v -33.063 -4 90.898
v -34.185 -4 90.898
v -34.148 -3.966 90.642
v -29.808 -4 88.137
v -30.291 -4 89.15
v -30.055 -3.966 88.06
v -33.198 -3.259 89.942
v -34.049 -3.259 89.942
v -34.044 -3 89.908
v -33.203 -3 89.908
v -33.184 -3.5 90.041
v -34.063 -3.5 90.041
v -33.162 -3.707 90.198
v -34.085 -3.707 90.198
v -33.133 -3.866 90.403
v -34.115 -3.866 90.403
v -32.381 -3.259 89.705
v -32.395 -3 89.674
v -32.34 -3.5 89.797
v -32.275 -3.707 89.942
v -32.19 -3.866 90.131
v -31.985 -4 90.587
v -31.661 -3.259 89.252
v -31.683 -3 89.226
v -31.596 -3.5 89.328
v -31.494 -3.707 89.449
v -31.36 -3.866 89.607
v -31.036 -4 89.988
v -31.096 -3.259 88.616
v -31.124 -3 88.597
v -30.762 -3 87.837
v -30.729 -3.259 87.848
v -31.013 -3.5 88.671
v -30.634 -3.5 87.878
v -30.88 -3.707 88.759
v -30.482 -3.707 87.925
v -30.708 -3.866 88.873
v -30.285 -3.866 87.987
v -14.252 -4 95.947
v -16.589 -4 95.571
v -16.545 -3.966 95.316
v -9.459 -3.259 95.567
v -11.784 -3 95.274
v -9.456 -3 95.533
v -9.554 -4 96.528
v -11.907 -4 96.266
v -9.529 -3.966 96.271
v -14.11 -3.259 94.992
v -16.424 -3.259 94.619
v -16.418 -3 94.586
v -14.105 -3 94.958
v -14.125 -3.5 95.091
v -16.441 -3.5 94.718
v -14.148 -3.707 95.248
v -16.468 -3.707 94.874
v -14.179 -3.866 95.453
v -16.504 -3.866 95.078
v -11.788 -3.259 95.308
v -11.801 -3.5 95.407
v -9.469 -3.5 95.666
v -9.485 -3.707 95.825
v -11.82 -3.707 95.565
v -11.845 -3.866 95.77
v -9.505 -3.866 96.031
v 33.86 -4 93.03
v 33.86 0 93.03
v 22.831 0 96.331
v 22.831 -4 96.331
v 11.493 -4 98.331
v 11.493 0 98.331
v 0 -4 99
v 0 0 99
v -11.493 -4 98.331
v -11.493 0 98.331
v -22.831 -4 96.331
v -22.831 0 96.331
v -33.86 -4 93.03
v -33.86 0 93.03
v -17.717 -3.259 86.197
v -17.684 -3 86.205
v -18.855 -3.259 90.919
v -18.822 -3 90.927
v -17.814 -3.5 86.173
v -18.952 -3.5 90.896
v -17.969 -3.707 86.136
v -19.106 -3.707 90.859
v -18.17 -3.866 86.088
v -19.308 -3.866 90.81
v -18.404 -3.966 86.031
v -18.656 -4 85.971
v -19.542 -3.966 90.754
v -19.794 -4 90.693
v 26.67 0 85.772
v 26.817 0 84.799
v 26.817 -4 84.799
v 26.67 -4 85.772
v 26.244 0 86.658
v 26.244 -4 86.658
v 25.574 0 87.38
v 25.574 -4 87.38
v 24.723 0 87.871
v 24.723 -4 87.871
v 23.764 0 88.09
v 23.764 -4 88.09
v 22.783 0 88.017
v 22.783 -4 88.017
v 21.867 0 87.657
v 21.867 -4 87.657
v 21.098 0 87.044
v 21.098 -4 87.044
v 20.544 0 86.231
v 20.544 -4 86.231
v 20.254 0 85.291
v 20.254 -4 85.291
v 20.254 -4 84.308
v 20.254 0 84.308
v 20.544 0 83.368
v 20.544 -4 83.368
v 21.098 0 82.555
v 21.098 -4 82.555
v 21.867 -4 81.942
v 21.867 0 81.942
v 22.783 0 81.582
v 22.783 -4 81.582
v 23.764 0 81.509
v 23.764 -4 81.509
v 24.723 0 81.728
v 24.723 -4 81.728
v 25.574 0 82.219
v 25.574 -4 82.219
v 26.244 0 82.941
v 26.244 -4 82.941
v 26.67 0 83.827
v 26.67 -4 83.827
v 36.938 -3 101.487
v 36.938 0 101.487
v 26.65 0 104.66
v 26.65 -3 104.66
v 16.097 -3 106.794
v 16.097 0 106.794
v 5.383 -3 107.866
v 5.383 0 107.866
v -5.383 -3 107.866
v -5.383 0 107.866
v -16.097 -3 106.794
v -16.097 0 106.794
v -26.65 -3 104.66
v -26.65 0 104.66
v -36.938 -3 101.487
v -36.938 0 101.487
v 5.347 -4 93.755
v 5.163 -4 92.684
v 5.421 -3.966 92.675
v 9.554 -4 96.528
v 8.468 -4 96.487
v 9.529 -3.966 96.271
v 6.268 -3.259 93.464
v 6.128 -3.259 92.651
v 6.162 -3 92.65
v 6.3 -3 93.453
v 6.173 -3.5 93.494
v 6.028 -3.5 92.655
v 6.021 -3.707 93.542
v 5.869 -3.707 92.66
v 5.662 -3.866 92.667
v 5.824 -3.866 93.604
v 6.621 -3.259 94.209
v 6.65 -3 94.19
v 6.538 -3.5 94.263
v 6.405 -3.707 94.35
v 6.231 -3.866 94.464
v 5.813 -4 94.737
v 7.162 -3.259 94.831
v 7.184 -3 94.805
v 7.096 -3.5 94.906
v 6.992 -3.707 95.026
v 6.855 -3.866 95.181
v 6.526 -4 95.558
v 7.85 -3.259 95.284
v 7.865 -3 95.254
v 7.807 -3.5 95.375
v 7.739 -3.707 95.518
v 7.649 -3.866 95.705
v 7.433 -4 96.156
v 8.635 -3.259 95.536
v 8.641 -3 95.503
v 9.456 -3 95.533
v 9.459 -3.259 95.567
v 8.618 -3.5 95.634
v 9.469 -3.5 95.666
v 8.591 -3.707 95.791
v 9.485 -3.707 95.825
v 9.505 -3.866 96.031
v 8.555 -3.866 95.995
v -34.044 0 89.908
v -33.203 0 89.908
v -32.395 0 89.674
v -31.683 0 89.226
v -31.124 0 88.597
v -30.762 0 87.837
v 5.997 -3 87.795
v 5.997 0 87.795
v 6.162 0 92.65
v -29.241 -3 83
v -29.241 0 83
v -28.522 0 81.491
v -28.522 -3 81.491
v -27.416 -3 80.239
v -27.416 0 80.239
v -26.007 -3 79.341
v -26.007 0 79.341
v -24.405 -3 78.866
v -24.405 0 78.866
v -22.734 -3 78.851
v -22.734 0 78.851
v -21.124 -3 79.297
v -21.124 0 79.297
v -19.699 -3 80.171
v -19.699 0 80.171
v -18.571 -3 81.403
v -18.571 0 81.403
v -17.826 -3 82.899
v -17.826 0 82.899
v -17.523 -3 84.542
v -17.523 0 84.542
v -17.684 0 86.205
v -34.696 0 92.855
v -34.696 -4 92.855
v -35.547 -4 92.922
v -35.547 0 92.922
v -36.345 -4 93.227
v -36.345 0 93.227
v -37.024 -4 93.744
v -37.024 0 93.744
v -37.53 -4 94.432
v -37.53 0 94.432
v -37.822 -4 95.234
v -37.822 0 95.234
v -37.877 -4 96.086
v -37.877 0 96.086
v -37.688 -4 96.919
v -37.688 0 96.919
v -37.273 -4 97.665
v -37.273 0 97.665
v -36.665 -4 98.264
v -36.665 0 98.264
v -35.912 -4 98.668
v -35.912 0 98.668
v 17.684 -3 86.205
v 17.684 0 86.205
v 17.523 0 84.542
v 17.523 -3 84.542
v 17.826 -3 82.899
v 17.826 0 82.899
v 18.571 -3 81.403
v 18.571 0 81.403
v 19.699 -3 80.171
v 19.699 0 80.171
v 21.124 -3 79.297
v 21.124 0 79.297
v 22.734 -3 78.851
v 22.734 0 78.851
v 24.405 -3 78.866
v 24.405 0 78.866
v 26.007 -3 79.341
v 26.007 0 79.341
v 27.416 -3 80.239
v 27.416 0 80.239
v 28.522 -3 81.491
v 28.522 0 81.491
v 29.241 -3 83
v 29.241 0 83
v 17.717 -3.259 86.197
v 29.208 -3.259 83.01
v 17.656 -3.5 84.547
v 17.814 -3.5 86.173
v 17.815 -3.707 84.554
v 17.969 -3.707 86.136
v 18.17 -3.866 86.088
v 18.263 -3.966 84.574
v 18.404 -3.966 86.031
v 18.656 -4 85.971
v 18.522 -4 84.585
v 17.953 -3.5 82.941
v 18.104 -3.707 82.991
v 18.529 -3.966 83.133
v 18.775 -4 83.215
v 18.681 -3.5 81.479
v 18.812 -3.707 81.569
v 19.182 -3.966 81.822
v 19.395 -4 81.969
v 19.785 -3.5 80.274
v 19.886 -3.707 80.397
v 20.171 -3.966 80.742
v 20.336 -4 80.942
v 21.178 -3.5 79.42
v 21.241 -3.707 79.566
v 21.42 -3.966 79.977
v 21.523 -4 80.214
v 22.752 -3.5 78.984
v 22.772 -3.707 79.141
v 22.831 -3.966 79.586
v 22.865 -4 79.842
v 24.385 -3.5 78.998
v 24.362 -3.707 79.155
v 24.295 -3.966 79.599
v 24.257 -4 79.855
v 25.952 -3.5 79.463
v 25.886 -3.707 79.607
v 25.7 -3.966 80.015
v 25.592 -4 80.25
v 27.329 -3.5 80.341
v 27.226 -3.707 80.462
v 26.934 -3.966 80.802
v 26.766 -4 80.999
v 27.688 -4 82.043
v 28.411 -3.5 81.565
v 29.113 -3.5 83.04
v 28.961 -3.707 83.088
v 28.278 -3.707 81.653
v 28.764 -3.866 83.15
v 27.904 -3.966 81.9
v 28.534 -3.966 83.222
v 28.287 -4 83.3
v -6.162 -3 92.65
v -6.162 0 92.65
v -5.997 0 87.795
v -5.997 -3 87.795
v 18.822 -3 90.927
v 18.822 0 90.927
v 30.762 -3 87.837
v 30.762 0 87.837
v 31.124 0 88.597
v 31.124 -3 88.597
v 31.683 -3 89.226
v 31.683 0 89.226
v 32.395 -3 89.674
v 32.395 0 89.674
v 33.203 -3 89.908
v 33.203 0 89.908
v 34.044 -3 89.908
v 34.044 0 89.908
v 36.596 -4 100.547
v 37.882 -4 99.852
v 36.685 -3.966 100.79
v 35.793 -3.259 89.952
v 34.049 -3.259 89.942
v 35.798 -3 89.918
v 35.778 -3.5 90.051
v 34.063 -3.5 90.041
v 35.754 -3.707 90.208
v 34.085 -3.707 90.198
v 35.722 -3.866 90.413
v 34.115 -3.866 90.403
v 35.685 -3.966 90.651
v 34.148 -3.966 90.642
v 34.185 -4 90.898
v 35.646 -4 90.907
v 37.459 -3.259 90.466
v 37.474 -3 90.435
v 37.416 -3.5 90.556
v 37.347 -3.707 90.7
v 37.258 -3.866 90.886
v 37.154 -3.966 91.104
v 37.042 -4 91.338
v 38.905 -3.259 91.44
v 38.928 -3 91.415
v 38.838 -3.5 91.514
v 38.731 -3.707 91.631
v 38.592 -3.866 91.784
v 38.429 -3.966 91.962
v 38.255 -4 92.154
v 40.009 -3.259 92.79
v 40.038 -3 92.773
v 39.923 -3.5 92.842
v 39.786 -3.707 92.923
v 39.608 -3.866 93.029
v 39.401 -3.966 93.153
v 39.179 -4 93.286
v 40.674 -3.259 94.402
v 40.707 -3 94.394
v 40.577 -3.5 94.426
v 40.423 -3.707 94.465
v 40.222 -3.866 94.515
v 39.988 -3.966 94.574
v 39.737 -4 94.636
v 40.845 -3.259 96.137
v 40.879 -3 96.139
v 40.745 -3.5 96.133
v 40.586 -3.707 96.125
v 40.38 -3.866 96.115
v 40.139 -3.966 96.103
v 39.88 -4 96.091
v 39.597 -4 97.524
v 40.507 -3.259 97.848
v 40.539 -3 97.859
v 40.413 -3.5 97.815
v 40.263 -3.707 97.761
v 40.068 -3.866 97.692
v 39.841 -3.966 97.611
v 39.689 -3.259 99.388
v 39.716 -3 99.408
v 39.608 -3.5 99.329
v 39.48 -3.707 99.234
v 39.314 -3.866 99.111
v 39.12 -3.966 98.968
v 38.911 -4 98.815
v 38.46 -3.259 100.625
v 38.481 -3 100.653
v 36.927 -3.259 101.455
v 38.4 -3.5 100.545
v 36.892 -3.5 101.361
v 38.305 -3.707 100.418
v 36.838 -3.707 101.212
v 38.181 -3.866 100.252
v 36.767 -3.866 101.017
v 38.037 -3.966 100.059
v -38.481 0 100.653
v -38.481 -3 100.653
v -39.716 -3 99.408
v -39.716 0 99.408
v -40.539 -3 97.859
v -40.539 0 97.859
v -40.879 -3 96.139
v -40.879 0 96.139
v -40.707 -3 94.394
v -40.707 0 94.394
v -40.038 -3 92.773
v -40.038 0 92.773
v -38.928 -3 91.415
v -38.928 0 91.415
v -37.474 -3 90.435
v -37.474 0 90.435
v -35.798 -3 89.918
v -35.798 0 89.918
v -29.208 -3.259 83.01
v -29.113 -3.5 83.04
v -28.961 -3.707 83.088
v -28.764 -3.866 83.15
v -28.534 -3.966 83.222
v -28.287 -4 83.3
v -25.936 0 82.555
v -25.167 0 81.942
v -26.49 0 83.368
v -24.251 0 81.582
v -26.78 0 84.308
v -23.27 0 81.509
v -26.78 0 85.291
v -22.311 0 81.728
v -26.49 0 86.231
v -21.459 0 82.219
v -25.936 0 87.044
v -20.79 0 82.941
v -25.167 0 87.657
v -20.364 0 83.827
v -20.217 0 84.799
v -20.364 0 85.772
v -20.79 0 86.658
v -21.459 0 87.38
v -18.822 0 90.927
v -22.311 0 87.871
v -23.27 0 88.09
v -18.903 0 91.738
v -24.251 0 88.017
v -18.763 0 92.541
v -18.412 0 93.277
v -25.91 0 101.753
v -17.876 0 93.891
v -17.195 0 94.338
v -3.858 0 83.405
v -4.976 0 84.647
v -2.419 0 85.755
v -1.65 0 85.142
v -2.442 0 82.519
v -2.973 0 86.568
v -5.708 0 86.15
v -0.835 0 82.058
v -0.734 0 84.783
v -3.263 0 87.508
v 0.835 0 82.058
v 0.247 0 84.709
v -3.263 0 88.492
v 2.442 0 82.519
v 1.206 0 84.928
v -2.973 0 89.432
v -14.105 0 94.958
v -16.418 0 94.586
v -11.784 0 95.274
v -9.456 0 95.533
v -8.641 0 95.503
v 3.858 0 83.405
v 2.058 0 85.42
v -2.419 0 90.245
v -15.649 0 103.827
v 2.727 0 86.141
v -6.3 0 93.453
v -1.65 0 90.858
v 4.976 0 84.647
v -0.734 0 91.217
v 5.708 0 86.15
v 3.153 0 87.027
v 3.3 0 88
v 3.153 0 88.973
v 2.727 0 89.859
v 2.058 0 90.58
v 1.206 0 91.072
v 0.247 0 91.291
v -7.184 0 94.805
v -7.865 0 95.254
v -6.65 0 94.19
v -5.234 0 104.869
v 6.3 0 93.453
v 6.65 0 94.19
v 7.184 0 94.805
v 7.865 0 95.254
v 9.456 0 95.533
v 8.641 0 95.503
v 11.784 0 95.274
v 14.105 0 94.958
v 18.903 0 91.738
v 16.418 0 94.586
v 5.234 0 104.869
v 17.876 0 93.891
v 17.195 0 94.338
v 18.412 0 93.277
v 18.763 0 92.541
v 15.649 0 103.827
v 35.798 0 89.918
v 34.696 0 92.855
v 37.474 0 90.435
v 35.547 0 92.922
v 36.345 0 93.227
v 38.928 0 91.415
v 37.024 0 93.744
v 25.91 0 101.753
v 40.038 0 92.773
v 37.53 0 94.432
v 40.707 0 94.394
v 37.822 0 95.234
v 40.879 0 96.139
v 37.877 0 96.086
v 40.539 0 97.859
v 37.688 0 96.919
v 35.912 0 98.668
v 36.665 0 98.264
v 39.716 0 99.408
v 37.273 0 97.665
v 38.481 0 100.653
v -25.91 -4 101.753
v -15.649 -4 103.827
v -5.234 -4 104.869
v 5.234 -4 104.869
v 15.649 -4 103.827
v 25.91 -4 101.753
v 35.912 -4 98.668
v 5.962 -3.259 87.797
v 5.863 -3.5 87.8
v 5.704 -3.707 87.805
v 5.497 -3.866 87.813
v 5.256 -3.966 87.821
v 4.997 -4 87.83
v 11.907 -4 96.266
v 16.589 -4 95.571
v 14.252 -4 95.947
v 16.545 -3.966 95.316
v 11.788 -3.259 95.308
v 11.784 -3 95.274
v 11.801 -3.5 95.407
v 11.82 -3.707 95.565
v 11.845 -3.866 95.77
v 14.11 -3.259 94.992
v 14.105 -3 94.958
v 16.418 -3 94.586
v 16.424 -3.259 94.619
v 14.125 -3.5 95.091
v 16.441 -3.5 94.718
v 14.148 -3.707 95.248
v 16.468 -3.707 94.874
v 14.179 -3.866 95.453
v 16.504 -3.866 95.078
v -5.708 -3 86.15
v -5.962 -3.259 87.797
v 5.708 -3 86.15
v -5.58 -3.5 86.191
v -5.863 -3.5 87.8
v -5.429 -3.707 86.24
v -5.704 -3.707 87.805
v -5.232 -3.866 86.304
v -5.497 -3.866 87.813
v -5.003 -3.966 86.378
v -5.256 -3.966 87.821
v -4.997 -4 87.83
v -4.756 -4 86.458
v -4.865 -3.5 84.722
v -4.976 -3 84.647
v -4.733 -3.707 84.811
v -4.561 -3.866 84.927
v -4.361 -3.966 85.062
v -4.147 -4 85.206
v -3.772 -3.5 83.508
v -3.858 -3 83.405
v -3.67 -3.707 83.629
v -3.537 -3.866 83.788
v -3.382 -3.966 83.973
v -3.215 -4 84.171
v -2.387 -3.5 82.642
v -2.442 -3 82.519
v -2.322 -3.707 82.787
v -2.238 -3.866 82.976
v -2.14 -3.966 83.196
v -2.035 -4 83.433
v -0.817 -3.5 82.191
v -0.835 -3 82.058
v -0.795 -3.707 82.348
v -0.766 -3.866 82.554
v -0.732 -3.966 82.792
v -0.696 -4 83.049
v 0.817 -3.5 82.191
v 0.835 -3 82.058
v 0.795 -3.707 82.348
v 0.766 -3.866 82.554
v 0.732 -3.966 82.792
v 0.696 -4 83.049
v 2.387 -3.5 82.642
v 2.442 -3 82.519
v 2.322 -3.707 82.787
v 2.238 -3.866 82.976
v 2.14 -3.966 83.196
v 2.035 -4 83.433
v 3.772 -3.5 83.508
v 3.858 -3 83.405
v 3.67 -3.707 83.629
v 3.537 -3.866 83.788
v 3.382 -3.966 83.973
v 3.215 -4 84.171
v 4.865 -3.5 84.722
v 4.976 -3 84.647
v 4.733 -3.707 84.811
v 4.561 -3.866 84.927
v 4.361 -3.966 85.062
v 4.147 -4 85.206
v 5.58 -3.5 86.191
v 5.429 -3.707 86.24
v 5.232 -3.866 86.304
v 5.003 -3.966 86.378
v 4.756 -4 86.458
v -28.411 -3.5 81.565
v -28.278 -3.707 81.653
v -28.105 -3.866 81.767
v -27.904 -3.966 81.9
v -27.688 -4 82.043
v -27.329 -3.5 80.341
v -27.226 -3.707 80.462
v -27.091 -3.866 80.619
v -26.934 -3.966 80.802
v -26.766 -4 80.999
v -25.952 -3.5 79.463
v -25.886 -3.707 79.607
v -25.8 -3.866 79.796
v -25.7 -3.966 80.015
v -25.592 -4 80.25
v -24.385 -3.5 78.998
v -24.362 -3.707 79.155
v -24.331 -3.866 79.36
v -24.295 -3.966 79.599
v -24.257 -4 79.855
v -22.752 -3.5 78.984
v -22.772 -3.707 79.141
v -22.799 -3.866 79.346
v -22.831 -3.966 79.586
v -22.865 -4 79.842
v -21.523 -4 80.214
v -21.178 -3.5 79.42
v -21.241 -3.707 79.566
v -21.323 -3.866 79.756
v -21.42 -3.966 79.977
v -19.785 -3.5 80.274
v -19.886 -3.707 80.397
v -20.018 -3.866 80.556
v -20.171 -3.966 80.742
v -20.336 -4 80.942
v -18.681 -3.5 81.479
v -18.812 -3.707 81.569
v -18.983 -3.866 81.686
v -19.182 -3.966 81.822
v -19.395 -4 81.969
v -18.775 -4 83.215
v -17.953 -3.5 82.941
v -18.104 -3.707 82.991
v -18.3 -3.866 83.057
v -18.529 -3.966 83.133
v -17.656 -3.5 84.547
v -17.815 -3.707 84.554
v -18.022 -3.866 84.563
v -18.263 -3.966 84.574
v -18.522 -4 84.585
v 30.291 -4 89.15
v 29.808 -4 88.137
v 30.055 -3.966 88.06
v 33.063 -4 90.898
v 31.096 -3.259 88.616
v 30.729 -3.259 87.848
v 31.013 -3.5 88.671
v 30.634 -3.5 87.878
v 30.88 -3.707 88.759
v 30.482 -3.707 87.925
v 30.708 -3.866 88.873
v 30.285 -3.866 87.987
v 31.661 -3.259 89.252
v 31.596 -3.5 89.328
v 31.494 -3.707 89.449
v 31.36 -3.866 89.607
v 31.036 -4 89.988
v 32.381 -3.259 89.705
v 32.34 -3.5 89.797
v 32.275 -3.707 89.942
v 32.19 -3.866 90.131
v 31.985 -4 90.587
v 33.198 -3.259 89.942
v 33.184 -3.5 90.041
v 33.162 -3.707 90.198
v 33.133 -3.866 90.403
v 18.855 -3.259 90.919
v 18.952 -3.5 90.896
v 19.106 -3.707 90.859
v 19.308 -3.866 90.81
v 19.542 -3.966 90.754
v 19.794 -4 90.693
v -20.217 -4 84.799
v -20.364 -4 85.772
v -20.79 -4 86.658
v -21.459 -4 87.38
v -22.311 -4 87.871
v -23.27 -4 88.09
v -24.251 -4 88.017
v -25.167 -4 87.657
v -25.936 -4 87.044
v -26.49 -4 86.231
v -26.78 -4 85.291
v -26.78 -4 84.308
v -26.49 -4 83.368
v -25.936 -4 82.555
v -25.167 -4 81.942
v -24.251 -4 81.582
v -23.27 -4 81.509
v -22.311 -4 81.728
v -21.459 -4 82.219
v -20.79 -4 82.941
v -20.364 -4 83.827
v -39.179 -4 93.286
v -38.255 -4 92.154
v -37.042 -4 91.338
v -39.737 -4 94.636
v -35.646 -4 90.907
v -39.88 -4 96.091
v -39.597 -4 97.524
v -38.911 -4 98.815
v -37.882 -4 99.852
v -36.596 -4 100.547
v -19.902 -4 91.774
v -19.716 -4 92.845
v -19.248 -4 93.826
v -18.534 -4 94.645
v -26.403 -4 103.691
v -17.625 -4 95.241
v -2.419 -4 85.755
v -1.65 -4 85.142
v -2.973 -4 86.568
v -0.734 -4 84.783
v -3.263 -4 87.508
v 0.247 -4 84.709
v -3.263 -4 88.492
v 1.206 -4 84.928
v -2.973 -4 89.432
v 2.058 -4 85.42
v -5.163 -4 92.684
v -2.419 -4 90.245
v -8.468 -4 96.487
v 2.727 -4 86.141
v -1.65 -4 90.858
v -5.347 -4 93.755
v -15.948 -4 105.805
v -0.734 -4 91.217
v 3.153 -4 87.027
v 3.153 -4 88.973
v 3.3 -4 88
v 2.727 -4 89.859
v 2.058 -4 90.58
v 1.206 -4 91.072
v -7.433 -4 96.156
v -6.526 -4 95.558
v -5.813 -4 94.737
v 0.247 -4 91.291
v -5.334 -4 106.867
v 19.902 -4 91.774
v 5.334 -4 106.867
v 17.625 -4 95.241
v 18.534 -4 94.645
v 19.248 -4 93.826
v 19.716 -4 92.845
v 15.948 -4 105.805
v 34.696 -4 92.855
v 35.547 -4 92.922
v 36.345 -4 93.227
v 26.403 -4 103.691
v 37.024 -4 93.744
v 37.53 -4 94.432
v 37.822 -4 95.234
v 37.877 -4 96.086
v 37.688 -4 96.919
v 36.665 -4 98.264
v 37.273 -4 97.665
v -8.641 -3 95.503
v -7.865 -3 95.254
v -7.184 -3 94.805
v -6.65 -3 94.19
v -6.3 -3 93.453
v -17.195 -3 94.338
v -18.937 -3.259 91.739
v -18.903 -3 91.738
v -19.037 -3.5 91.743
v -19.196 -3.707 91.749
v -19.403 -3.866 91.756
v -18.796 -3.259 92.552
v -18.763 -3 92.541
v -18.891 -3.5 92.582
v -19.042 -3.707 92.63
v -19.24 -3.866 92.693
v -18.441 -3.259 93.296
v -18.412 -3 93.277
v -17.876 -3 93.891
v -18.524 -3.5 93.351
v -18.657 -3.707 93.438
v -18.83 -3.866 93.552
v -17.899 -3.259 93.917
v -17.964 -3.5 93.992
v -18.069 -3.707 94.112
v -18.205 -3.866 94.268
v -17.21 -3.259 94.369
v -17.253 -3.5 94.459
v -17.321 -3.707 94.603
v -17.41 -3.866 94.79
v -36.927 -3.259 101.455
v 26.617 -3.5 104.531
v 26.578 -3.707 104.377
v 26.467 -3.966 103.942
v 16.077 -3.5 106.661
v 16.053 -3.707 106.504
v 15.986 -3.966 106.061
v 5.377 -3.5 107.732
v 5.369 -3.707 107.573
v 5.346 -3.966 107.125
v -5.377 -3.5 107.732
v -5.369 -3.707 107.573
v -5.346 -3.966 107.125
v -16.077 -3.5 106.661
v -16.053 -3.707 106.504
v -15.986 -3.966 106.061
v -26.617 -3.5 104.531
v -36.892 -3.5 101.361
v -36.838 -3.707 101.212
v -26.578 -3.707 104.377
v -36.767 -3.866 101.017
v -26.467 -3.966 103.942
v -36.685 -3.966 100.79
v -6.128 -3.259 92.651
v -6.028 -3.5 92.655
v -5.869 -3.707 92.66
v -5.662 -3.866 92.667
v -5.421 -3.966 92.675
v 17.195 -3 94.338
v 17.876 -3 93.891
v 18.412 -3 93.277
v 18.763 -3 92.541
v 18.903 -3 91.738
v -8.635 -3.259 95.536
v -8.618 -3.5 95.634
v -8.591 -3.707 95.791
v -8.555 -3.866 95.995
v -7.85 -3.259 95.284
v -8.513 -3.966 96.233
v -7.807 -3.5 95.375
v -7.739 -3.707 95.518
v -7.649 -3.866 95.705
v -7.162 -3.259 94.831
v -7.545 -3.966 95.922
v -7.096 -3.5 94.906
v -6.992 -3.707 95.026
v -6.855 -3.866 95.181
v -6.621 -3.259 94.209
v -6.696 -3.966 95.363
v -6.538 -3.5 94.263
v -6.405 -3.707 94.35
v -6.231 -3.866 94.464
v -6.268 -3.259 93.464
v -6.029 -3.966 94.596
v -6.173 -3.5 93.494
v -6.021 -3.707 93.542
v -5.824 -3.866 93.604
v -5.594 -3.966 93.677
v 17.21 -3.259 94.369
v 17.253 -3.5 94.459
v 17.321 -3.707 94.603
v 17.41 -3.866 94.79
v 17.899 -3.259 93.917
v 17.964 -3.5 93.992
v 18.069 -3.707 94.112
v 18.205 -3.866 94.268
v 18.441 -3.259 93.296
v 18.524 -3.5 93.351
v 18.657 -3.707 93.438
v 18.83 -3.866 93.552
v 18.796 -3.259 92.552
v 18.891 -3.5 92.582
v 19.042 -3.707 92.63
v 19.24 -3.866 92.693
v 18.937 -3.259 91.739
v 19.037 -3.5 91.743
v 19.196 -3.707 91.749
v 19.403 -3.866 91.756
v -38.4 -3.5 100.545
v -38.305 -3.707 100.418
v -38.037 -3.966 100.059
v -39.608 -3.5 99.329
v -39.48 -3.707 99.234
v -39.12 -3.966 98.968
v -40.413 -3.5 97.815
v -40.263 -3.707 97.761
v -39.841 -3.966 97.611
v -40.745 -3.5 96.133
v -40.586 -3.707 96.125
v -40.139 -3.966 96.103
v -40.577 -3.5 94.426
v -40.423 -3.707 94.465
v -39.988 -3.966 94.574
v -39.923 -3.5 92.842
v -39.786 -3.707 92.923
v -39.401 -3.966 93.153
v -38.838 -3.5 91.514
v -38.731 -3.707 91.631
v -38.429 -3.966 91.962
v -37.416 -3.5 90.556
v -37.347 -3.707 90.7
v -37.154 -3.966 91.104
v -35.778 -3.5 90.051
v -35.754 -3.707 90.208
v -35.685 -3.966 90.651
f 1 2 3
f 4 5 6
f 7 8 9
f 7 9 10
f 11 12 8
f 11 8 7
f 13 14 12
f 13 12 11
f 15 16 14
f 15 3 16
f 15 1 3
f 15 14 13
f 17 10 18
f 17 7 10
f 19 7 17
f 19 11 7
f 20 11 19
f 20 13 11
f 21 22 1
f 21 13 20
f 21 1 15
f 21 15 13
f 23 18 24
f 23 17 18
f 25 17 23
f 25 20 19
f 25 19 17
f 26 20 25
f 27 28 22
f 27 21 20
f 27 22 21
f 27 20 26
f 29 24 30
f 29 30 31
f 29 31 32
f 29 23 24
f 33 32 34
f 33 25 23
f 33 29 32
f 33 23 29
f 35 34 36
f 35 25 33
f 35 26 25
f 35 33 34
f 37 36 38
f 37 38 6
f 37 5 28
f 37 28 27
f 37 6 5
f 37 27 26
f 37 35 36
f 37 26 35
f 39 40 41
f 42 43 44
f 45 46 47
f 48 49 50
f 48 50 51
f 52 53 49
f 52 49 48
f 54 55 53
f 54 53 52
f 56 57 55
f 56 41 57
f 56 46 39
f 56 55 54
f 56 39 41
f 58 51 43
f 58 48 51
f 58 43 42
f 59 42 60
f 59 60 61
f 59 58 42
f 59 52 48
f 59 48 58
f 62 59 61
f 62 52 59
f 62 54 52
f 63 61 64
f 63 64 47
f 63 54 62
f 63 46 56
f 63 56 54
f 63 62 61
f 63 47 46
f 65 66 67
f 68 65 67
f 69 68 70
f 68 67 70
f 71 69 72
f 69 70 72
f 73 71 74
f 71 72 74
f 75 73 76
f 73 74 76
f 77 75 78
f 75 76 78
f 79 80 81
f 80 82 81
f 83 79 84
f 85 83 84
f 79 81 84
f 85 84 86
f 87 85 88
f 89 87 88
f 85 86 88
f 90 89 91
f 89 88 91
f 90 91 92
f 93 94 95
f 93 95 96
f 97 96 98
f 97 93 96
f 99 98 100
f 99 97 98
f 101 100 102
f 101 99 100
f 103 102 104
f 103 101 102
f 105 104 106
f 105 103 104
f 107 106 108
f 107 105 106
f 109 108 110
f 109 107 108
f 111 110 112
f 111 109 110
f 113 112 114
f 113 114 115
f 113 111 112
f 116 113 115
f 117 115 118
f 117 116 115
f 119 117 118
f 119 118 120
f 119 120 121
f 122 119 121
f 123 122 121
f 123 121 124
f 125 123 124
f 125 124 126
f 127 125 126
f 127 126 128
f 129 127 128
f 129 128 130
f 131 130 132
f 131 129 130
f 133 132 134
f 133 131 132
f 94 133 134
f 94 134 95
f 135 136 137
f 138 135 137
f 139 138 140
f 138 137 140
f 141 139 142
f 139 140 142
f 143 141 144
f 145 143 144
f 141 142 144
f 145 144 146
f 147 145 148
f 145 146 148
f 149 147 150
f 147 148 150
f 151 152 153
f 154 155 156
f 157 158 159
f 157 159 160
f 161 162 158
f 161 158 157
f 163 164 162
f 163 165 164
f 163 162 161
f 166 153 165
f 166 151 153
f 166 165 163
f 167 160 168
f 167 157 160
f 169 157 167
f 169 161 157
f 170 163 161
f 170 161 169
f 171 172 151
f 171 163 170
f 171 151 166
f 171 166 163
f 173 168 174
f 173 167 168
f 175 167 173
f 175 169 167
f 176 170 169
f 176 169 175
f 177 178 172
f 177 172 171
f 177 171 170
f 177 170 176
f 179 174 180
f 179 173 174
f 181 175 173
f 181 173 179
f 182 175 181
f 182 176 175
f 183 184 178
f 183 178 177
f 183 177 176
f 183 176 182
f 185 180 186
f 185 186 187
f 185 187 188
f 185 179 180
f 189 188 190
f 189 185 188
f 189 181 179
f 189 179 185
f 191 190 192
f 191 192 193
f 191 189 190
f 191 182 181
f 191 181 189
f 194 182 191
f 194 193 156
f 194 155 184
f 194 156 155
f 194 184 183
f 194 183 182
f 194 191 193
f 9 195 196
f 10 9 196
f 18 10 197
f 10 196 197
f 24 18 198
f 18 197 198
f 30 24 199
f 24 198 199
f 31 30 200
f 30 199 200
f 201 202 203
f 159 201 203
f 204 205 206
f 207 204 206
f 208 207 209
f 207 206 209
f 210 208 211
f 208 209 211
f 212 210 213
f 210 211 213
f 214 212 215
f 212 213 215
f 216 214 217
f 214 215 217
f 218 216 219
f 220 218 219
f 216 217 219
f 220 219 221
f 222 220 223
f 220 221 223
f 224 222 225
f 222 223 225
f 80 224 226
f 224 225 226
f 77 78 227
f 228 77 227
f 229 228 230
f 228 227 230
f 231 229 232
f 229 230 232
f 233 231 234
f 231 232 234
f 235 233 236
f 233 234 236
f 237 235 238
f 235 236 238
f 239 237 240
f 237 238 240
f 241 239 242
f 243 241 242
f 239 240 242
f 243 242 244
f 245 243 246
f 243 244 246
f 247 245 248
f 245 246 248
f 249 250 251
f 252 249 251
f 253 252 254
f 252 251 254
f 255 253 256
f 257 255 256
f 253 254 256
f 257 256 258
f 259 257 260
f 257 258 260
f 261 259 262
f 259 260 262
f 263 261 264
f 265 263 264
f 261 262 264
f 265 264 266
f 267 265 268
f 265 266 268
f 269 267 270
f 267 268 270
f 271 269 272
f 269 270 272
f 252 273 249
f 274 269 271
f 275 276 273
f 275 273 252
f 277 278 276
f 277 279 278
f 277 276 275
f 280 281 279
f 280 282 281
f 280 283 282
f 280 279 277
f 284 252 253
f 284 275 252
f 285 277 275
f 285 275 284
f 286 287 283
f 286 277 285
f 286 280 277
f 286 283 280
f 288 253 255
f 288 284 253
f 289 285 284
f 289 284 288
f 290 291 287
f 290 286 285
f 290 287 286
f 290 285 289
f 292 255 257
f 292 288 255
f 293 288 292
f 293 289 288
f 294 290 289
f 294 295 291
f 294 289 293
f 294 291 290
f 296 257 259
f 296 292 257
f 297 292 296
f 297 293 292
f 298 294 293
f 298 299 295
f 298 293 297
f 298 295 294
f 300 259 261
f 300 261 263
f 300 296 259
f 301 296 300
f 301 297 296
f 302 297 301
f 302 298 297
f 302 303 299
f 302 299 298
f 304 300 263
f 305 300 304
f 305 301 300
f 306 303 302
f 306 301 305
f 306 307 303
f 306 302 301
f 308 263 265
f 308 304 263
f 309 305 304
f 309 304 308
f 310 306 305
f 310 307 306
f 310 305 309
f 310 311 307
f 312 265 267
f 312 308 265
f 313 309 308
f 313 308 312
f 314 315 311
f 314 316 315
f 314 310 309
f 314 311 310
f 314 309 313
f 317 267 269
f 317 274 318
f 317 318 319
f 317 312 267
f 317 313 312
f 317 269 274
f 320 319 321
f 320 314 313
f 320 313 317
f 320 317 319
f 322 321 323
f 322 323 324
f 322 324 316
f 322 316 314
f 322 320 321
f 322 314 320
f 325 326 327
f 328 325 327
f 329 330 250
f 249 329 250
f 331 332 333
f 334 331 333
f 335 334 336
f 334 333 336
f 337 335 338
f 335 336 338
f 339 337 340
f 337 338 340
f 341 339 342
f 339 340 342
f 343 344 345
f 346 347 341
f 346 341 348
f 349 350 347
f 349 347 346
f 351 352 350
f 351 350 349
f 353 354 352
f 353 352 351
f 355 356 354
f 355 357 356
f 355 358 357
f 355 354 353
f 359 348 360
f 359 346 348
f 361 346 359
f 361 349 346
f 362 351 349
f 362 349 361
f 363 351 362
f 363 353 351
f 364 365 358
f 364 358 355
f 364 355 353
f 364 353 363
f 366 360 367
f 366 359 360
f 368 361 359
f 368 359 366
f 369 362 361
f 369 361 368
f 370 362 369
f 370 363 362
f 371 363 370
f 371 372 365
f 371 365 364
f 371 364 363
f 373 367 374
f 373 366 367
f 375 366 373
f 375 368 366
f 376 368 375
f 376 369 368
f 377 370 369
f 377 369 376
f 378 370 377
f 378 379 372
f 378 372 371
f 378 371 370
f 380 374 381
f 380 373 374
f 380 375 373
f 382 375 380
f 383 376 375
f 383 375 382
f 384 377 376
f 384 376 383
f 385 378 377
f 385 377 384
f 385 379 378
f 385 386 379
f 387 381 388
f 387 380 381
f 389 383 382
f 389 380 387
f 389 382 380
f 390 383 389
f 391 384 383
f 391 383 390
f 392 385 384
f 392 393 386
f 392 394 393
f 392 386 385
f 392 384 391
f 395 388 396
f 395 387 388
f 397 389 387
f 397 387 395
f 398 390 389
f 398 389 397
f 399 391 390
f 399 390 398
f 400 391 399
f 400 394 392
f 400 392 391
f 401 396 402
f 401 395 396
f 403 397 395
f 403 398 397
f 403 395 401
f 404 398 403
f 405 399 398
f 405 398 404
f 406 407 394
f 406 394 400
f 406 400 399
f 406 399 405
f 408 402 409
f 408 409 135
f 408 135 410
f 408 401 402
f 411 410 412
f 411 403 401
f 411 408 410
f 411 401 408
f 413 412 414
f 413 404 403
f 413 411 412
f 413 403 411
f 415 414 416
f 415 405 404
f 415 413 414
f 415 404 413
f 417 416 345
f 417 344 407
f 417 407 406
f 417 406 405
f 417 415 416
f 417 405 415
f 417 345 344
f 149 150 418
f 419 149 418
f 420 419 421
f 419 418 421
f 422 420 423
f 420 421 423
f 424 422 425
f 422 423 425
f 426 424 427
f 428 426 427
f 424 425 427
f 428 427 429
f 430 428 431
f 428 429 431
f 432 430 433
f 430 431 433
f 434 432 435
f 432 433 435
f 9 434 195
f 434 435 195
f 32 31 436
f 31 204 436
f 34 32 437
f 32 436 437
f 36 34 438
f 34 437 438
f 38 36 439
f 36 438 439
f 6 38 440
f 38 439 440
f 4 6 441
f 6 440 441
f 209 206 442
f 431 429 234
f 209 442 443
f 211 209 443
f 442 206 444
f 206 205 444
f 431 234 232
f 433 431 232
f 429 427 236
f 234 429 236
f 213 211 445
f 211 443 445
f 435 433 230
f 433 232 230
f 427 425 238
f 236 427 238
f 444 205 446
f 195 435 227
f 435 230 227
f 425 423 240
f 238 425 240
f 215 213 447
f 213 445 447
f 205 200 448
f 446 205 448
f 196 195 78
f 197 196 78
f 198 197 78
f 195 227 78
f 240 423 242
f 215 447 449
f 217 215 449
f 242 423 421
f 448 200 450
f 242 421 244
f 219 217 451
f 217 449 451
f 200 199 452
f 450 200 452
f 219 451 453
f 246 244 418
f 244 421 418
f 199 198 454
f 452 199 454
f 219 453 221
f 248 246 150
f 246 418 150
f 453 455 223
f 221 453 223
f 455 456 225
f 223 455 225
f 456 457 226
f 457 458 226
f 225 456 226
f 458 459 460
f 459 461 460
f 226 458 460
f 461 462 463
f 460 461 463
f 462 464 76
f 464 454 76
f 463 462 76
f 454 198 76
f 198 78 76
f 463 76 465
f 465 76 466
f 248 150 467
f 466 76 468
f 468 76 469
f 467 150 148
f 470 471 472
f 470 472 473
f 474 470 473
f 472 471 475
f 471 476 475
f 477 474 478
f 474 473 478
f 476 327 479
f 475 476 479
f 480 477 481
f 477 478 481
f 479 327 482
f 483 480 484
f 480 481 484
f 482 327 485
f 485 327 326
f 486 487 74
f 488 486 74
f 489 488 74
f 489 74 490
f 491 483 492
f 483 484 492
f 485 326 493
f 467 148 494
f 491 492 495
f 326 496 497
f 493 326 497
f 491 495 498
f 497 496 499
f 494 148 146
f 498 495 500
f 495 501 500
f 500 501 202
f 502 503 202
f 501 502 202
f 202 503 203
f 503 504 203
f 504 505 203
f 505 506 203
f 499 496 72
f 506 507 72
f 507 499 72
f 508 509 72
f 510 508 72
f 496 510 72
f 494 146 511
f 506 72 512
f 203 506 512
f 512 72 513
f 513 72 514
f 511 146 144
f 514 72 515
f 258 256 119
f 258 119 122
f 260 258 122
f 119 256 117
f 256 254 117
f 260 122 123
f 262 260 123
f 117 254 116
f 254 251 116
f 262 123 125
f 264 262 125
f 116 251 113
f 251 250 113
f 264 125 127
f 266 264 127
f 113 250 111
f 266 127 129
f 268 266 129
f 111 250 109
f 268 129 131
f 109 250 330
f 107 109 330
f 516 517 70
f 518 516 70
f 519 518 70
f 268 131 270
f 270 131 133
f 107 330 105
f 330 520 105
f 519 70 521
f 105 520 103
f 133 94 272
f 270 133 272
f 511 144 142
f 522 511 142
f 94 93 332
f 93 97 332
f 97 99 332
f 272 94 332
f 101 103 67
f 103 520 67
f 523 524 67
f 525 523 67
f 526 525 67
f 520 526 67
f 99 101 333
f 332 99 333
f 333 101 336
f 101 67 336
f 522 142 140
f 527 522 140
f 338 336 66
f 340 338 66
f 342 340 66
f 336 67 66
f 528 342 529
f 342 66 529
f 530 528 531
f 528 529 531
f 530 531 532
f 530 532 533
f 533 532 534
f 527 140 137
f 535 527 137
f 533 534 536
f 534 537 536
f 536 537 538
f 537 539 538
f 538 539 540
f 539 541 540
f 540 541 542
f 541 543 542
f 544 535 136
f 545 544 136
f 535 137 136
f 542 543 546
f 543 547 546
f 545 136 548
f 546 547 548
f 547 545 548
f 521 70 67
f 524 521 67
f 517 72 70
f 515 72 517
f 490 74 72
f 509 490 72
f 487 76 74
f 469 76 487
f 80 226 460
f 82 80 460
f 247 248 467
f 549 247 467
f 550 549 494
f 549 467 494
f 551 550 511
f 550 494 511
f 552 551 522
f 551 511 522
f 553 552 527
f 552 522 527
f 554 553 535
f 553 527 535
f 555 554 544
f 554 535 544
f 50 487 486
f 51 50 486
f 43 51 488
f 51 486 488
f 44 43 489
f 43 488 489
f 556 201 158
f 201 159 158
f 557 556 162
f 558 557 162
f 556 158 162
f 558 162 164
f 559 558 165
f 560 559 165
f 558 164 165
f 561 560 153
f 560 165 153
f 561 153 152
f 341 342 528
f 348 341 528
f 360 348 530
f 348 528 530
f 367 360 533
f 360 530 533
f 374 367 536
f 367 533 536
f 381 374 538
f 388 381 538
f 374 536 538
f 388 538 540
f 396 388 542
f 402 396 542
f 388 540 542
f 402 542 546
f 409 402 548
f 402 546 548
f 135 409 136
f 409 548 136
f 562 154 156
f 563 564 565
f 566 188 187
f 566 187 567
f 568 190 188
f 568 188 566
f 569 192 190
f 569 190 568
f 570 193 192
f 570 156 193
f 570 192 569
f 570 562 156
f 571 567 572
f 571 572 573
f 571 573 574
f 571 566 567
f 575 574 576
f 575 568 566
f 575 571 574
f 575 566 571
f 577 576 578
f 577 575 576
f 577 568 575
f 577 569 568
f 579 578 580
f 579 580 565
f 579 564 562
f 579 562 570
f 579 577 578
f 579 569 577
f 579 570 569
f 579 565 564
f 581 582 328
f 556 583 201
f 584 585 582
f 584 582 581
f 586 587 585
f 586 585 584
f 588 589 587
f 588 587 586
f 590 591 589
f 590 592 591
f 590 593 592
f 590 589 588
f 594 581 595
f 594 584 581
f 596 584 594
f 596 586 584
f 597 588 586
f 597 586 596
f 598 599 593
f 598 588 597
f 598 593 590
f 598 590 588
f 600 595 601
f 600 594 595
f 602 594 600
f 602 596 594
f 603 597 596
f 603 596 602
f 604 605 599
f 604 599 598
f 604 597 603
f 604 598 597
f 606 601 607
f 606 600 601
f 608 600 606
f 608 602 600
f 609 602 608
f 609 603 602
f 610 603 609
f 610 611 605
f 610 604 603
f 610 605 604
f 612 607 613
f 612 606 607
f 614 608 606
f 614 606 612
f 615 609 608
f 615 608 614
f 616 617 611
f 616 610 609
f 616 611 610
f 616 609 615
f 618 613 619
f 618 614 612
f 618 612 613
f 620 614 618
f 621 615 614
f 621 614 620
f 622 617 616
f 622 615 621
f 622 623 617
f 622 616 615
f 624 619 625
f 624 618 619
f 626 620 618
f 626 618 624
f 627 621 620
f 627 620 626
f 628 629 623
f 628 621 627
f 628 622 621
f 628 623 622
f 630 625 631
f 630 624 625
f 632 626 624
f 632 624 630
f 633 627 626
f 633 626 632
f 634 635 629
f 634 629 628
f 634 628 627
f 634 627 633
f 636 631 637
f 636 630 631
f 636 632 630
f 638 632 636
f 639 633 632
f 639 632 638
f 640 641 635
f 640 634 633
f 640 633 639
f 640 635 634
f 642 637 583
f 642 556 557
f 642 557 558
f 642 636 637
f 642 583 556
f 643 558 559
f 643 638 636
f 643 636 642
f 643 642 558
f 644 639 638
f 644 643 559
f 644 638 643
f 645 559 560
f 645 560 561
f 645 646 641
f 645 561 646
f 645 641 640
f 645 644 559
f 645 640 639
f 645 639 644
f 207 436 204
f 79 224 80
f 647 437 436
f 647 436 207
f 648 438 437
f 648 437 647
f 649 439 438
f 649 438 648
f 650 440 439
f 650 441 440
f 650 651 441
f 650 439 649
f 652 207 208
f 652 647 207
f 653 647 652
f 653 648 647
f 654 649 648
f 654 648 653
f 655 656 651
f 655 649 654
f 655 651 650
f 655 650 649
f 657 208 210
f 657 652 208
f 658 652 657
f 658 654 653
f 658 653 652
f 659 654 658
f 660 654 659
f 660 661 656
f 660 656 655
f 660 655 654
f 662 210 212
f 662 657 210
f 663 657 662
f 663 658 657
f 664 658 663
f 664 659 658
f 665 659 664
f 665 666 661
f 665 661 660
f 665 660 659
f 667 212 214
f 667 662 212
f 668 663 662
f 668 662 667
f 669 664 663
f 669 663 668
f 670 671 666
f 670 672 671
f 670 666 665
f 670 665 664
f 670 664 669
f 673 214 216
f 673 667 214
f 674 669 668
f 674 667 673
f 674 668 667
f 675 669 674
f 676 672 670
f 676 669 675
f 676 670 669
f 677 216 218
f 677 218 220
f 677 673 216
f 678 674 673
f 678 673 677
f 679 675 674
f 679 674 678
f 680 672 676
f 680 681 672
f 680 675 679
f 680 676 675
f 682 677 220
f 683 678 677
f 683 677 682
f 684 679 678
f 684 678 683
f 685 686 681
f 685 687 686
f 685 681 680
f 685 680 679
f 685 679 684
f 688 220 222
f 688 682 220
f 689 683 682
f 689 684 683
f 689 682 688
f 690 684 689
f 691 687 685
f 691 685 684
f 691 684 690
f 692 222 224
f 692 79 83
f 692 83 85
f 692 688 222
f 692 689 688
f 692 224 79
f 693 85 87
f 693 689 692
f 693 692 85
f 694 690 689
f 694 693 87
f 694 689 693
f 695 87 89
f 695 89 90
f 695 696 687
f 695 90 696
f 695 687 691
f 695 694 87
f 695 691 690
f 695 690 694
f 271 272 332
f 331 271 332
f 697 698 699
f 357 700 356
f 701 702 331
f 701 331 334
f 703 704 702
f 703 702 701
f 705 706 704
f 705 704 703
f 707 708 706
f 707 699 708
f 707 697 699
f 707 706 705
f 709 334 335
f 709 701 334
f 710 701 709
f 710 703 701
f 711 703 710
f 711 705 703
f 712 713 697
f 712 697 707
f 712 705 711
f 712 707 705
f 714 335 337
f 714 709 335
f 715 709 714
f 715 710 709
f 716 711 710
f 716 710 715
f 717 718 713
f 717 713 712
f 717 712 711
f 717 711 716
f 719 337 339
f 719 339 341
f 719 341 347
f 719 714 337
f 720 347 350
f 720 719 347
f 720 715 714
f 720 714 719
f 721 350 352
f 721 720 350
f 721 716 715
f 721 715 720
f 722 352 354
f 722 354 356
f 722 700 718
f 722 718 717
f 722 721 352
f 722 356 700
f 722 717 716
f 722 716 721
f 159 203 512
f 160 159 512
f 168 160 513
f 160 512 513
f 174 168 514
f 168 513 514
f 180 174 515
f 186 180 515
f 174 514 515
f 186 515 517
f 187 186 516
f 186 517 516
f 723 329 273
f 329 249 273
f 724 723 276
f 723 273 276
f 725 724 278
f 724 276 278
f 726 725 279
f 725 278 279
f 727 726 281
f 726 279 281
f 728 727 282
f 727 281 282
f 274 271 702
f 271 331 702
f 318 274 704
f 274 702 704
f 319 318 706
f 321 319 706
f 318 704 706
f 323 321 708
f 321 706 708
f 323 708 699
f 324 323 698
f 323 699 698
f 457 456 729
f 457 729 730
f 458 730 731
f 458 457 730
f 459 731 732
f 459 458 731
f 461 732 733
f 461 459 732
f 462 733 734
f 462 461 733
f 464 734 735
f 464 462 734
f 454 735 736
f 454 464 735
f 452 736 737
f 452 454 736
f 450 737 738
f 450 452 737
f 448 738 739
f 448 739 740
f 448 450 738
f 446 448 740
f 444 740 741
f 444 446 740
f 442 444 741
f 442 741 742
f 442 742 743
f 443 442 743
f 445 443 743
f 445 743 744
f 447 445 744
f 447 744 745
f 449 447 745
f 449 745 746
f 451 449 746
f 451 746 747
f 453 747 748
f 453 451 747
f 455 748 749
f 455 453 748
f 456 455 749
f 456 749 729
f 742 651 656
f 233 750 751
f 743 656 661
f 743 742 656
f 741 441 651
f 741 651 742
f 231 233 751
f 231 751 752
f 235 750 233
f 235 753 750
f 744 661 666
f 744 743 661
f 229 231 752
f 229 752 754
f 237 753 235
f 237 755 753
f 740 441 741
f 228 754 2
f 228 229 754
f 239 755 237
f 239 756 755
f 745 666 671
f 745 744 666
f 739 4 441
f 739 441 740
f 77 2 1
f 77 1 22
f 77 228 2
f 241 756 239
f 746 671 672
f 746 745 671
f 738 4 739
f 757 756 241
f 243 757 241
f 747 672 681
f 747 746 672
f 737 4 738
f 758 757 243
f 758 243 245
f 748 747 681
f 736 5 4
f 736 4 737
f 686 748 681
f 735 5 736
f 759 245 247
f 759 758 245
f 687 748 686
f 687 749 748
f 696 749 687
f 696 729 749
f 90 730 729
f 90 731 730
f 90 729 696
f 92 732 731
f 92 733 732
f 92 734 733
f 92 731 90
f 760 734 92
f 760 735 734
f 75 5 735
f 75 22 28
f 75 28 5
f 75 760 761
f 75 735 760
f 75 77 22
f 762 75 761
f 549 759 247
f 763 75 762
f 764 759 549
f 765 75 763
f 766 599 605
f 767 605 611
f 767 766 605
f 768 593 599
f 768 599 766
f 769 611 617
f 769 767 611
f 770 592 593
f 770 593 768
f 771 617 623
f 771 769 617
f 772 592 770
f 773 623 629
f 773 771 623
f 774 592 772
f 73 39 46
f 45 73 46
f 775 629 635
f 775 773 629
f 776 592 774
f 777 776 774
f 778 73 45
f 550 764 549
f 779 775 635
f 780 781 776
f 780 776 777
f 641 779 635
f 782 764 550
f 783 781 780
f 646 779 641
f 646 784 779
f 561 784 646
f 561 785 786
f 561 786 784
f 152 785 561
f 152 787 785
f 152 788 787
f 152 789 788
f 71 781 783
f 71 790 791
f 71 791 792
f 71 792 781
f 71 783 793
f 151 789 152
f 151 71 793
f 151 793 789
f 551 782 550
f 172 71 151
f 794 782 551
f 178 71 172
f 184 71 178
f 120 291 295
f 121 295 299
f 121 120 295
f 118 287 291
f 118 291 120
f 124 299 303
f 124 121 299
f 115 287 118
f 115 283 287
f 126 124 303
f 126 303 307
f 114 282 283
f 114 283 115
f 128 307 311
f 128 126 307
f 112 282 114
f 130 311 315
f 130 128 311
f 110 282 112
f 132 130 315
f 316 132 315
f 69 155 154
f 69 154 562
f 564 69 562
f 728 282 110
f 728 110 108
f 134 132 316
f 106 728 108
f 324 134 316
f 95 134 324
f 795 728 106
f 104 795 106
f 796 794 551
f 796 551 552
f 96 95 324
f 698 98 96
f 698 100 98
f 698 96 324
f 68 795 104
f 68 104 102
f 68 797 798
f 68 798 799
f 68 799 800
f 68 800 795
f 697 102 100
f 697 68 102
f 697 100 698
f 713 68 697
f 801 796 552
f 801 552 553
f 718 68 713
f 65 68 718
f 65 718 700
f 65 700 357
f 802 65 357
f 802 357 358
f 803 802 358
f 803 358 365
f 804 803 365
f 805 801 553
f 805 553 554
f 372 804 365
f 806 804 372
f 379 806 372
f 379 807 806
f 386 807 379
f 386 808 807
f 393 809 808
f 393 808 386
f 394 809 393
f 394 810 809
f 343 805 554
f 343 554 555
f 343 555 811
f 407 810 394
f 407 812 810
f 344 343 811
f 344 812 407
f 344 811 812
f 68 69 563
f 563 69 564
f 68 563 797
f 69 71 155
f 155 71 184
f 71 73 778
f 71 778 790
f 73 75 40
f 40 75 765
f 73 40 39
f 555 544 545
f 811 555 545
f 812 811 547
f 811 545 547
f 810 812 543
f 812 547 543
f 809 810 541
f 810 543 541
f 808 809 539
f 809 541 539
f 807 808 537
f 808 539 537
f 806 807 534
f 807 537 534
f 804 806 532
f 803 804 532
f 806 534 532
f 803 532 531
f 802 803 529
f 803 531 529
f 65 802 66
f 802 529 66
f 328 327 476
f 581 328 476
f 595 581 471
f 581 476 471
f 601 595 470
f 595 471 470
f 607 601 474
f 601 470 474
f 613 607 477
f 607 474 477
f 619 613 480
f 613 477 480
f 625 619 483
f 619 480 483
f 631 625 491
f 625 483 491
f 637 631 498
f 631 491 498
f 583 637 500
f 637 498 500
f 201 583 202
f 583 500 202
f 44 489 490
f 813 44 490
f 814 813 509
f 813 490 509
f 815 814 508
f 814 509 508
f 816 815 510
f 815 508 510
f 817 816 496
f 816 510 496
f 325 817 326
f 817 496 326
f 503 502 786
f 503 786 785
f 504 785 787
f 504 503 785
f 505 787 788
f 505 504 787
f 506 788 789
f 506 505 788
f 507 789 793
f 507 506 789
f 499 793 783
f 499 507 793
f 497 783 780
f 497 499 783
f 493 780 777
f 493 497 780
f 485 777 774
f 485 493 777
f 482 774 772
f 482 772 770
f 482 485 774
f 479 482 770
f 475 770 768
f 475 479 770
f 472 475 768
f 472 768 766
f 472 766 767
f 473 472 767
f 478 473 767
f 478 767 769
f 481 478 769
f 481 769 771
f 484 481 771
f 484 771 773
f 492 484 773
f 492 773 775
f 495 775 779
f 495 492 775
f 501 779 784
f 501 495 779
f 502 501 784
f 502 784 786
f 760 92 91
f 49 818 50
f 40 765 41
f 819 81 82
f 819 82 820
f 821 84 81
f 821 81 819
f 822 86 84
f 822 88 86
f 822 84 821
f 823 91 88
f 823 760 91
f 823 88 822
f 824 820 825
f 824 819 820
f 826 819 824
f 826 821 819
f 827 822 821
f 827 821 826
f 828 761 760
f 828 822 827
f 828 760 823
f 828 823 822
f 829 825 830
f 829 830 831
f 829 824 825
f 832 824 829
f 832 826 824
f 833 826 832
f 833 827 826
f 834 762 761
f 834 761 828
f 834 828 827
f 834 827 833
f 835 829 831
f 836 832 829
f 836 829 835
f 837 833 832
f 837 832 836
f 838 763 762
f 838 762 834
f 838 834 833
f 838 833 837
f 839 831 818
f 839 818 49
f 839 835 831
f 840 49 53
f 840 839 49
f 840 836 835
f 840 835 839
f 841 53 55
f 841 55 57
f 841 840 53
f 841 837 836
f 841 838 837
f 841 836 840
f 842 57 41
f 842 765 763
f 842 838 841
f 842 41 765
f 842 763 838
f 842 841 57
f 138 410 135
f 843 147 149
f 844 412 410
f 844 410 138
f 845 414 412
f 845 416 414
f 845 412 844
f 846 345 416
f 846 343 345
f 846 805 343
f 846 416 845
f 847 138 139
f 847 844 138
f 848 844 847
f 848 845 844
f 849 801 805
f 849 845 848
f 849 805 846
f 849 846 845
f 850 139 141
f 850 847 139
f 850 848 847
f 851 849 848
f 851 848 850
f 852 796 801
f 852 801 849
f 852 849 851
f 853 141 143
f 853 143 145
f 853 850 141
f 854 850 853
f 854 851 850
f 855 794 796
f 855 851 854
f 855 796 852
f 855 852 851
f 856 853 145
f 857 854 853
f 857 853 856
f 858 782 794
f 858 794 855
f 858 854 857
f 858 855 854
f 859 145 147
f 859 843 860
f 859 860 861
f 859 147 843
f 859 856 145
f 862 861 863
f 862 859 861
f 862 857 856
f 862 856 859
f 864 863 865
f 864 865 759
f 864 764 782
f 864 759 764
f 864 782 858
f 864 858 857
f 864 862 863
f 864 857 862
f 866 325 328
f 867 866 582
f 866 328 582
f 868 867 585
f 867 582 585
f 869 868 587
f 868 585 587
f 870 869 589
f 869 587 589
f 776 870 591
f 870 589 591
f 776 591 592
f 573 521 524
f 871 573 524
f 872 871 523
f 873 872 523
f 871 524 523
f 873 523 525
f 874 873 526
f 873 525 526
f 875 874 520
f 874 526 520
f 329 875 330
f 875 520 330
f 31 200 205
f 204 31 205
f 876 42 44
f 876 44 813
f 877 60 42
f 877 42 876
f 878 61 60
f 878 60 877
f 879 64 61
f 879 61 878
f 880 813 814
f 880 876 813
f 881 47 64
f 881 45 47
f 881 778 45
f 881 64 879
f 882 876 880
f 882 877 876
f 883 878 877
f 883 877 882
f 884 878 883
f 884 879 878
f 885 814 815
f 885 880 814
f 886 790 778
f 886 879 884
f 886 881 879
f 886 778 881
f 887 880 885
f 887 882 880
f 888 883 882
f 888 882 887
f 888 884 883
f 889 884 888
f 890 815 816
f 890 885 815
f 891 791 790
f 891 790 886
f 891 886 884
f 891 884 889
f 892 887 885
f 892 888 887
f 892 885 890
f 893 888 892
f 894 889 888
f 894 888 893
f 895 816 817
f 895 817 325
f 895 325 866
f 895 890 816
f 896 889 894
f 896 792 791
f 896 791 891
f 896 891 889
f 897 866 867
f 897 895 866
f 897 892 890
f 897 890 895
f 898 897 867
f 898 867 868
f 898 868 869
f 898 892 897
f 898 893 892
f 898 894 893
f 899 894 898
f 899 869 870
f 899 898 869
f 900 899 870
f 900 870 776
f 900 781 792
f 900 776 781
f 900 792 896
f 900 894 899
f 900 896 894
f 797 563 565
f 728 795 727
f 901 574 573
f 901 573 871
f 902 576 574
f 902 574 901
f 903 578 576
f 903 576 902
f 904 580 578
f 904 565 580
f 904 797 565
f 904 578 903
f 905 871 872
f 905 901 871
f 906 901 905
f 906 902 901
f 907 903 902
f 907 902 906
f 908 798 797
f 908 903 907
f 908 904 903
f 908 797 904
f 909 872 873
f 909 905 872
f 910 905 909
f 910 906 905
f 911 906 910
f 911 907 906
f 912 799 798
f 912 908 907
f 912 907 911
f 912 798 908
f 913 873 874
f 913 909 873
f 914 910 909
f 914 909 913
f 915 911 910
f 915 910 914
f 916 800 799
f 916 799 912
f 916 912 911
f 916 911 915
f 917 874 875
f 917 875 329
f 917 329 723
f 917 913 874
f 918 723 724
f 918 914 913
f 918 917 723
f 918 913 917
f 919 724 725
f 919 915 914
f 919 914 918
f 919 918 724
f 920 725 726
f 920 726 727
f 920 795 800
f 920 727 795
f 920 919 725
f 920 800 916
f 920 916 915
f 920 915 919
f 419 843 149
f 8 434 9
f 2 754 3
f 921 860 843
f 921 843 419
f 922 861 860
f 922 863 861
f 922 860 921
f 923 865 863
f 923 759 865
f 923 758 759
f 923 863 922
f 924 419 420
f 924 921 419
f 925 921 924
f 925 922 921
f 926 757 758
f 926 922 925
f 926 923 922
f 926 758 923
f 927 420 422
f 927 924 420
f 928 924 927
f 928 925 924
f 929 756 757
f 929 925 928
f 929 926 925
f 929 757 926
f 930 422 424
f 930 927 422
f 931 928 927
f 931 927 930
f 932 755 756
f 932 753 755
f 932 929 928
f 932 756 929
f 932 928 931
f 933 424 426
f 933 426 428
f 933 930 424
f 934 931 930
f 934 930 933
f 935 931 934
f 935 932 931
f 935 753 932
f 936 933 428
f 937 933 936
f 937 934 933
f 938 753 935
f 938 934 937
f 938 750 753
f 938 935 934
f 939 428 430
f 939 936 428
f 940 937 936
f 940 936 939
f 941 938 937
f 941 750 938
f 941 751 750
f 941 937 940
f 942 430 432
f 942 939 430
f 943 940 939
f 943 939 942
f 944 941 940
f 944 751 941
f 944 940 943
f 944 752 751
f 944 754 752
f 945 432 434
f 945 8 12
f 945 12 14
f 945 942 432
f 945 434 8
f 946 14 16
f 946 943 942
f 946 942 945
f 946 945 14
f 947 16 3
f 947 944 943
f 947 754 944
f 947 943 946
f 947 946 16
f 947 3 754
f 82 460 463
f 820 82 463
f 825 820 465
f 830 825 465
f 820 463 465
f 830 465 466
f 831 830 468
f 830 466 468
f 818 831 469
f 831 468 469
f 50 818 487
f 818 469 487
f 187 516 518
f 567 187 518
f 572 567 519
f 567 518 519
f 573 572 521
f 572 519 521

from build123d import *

# Parameters (mm, degrees)
F0_R     = 3.3
F1_DEPTH = 4
F2_R     = 1


with BuildPart() as f1:
    # F0 (on Front) → F1 (new body)
    with BuildSketch(Plane.XZ):
        with BuildLine():
            ThreePointArc((34.044412, 89.907971), (40.707021, 94.393881), (36.938175, 101.486803))
            ThreePointArc((36.938175, 101.486803), (0, 108), (-36.938175, 101.486803))
            ThreePointArc((-36.938175, 101.486803), (-40.707021, 94.393881), (-34.044412, 89.907971))
            ThreePointArc((-34.044412, 89.907971), (-32.023131, 89.475058), (-30.761711, 87.837435))
            Line((-30.761711, 87.837435), (-29.240737, 82.999875))
            ThreePointArc((-29.240737, 82.999875), (-21.913547, 79.017697), (-17.683893, 86.204872))
            Line((-17.683893, 86.204872), (-18.821651, 90.927144))
            ThreePointArc((-18.821651, 90.927144), (-18.41244, 93.277047), (-16.418177, 94.585641))
            ThreePointArc((-16.418177, 94.585641), (-12.945689, 95.123126), (-9.455857, 95.533171))
            ThreePointArc((-9.455857, 95.533171), (-7.184419, 94.805114), (-6.162106, 92.650032))
            Line((-6.162106, 92.650032), (-5.996512, 87.795455))
            ThreePointArc((-5.996512, 87.795455), (0, 82), (5.996512, 87.795455))
            Line((5.996512, 87.795455), (6.162106, 92.650032))
            ThreePointArc((6.162106, 92.650032), (7.184419, 94.805114), (9.455857, 95.533171))
            ThreePointArc((9.455857, 95.533171), (12.945689, 95.123126), (16.418177, 94.585641))
            ThreePointArc((16.418177, 94.585641), (18.41244, 93.277047), (18.821651, 90.927144))
            Line((18.821651, 90.927144), (17.683893, 86.204872))
            ThreePointArc((17.683893, 86.204872), (21.913547, 79.017697), (29.240737, 82.999875))
            Line((29.240737, 82.999875), (30.761711, 87.837435))
            ThreePointArc((30.761711, 87.837435), (32.023131, 89.475058), (34.044412, 89.907971))
        make_face()
        with Locations((-23.516977, 84.79948)):
            Circle(F0_R, mode=Mode.SUBTRACT)
        with Locations((0, 88)):
            Circle(F0_R, mode=Mode.SUBTRACT)
        with Locations((23.516977, 84.79948)):
            Circle(F0_R, mode=Mode.SUBTRACT)
        with BuildLine():
            ThreePointArc((-35.912115, 98.667725), (0, 105), (35.912115, 98.667725))
            ThreePointArc((35.912115, 98.667725), (37.705132, 94.822587), (33.859994, 93.029569))
            ThreePointArc((33.859994, 93.029569), (0, 99), (-33.859994, 93.029569))
            ThreePointArc((-33.859994, 93.029569), (-37.705132, 94.822587), (-35.912115, 98.667725))
        make_face(mode=Mode.SUBTRACT)
    extrude(amount=F1_DEPTH)

    # F2
    f2_edges = [f1.edges().sort_by_distance(p)[0] for p in [
        (0, -4, 108),
    ]]
    fillet(f2_edges, radius=F2_R)


solid = f1.part
